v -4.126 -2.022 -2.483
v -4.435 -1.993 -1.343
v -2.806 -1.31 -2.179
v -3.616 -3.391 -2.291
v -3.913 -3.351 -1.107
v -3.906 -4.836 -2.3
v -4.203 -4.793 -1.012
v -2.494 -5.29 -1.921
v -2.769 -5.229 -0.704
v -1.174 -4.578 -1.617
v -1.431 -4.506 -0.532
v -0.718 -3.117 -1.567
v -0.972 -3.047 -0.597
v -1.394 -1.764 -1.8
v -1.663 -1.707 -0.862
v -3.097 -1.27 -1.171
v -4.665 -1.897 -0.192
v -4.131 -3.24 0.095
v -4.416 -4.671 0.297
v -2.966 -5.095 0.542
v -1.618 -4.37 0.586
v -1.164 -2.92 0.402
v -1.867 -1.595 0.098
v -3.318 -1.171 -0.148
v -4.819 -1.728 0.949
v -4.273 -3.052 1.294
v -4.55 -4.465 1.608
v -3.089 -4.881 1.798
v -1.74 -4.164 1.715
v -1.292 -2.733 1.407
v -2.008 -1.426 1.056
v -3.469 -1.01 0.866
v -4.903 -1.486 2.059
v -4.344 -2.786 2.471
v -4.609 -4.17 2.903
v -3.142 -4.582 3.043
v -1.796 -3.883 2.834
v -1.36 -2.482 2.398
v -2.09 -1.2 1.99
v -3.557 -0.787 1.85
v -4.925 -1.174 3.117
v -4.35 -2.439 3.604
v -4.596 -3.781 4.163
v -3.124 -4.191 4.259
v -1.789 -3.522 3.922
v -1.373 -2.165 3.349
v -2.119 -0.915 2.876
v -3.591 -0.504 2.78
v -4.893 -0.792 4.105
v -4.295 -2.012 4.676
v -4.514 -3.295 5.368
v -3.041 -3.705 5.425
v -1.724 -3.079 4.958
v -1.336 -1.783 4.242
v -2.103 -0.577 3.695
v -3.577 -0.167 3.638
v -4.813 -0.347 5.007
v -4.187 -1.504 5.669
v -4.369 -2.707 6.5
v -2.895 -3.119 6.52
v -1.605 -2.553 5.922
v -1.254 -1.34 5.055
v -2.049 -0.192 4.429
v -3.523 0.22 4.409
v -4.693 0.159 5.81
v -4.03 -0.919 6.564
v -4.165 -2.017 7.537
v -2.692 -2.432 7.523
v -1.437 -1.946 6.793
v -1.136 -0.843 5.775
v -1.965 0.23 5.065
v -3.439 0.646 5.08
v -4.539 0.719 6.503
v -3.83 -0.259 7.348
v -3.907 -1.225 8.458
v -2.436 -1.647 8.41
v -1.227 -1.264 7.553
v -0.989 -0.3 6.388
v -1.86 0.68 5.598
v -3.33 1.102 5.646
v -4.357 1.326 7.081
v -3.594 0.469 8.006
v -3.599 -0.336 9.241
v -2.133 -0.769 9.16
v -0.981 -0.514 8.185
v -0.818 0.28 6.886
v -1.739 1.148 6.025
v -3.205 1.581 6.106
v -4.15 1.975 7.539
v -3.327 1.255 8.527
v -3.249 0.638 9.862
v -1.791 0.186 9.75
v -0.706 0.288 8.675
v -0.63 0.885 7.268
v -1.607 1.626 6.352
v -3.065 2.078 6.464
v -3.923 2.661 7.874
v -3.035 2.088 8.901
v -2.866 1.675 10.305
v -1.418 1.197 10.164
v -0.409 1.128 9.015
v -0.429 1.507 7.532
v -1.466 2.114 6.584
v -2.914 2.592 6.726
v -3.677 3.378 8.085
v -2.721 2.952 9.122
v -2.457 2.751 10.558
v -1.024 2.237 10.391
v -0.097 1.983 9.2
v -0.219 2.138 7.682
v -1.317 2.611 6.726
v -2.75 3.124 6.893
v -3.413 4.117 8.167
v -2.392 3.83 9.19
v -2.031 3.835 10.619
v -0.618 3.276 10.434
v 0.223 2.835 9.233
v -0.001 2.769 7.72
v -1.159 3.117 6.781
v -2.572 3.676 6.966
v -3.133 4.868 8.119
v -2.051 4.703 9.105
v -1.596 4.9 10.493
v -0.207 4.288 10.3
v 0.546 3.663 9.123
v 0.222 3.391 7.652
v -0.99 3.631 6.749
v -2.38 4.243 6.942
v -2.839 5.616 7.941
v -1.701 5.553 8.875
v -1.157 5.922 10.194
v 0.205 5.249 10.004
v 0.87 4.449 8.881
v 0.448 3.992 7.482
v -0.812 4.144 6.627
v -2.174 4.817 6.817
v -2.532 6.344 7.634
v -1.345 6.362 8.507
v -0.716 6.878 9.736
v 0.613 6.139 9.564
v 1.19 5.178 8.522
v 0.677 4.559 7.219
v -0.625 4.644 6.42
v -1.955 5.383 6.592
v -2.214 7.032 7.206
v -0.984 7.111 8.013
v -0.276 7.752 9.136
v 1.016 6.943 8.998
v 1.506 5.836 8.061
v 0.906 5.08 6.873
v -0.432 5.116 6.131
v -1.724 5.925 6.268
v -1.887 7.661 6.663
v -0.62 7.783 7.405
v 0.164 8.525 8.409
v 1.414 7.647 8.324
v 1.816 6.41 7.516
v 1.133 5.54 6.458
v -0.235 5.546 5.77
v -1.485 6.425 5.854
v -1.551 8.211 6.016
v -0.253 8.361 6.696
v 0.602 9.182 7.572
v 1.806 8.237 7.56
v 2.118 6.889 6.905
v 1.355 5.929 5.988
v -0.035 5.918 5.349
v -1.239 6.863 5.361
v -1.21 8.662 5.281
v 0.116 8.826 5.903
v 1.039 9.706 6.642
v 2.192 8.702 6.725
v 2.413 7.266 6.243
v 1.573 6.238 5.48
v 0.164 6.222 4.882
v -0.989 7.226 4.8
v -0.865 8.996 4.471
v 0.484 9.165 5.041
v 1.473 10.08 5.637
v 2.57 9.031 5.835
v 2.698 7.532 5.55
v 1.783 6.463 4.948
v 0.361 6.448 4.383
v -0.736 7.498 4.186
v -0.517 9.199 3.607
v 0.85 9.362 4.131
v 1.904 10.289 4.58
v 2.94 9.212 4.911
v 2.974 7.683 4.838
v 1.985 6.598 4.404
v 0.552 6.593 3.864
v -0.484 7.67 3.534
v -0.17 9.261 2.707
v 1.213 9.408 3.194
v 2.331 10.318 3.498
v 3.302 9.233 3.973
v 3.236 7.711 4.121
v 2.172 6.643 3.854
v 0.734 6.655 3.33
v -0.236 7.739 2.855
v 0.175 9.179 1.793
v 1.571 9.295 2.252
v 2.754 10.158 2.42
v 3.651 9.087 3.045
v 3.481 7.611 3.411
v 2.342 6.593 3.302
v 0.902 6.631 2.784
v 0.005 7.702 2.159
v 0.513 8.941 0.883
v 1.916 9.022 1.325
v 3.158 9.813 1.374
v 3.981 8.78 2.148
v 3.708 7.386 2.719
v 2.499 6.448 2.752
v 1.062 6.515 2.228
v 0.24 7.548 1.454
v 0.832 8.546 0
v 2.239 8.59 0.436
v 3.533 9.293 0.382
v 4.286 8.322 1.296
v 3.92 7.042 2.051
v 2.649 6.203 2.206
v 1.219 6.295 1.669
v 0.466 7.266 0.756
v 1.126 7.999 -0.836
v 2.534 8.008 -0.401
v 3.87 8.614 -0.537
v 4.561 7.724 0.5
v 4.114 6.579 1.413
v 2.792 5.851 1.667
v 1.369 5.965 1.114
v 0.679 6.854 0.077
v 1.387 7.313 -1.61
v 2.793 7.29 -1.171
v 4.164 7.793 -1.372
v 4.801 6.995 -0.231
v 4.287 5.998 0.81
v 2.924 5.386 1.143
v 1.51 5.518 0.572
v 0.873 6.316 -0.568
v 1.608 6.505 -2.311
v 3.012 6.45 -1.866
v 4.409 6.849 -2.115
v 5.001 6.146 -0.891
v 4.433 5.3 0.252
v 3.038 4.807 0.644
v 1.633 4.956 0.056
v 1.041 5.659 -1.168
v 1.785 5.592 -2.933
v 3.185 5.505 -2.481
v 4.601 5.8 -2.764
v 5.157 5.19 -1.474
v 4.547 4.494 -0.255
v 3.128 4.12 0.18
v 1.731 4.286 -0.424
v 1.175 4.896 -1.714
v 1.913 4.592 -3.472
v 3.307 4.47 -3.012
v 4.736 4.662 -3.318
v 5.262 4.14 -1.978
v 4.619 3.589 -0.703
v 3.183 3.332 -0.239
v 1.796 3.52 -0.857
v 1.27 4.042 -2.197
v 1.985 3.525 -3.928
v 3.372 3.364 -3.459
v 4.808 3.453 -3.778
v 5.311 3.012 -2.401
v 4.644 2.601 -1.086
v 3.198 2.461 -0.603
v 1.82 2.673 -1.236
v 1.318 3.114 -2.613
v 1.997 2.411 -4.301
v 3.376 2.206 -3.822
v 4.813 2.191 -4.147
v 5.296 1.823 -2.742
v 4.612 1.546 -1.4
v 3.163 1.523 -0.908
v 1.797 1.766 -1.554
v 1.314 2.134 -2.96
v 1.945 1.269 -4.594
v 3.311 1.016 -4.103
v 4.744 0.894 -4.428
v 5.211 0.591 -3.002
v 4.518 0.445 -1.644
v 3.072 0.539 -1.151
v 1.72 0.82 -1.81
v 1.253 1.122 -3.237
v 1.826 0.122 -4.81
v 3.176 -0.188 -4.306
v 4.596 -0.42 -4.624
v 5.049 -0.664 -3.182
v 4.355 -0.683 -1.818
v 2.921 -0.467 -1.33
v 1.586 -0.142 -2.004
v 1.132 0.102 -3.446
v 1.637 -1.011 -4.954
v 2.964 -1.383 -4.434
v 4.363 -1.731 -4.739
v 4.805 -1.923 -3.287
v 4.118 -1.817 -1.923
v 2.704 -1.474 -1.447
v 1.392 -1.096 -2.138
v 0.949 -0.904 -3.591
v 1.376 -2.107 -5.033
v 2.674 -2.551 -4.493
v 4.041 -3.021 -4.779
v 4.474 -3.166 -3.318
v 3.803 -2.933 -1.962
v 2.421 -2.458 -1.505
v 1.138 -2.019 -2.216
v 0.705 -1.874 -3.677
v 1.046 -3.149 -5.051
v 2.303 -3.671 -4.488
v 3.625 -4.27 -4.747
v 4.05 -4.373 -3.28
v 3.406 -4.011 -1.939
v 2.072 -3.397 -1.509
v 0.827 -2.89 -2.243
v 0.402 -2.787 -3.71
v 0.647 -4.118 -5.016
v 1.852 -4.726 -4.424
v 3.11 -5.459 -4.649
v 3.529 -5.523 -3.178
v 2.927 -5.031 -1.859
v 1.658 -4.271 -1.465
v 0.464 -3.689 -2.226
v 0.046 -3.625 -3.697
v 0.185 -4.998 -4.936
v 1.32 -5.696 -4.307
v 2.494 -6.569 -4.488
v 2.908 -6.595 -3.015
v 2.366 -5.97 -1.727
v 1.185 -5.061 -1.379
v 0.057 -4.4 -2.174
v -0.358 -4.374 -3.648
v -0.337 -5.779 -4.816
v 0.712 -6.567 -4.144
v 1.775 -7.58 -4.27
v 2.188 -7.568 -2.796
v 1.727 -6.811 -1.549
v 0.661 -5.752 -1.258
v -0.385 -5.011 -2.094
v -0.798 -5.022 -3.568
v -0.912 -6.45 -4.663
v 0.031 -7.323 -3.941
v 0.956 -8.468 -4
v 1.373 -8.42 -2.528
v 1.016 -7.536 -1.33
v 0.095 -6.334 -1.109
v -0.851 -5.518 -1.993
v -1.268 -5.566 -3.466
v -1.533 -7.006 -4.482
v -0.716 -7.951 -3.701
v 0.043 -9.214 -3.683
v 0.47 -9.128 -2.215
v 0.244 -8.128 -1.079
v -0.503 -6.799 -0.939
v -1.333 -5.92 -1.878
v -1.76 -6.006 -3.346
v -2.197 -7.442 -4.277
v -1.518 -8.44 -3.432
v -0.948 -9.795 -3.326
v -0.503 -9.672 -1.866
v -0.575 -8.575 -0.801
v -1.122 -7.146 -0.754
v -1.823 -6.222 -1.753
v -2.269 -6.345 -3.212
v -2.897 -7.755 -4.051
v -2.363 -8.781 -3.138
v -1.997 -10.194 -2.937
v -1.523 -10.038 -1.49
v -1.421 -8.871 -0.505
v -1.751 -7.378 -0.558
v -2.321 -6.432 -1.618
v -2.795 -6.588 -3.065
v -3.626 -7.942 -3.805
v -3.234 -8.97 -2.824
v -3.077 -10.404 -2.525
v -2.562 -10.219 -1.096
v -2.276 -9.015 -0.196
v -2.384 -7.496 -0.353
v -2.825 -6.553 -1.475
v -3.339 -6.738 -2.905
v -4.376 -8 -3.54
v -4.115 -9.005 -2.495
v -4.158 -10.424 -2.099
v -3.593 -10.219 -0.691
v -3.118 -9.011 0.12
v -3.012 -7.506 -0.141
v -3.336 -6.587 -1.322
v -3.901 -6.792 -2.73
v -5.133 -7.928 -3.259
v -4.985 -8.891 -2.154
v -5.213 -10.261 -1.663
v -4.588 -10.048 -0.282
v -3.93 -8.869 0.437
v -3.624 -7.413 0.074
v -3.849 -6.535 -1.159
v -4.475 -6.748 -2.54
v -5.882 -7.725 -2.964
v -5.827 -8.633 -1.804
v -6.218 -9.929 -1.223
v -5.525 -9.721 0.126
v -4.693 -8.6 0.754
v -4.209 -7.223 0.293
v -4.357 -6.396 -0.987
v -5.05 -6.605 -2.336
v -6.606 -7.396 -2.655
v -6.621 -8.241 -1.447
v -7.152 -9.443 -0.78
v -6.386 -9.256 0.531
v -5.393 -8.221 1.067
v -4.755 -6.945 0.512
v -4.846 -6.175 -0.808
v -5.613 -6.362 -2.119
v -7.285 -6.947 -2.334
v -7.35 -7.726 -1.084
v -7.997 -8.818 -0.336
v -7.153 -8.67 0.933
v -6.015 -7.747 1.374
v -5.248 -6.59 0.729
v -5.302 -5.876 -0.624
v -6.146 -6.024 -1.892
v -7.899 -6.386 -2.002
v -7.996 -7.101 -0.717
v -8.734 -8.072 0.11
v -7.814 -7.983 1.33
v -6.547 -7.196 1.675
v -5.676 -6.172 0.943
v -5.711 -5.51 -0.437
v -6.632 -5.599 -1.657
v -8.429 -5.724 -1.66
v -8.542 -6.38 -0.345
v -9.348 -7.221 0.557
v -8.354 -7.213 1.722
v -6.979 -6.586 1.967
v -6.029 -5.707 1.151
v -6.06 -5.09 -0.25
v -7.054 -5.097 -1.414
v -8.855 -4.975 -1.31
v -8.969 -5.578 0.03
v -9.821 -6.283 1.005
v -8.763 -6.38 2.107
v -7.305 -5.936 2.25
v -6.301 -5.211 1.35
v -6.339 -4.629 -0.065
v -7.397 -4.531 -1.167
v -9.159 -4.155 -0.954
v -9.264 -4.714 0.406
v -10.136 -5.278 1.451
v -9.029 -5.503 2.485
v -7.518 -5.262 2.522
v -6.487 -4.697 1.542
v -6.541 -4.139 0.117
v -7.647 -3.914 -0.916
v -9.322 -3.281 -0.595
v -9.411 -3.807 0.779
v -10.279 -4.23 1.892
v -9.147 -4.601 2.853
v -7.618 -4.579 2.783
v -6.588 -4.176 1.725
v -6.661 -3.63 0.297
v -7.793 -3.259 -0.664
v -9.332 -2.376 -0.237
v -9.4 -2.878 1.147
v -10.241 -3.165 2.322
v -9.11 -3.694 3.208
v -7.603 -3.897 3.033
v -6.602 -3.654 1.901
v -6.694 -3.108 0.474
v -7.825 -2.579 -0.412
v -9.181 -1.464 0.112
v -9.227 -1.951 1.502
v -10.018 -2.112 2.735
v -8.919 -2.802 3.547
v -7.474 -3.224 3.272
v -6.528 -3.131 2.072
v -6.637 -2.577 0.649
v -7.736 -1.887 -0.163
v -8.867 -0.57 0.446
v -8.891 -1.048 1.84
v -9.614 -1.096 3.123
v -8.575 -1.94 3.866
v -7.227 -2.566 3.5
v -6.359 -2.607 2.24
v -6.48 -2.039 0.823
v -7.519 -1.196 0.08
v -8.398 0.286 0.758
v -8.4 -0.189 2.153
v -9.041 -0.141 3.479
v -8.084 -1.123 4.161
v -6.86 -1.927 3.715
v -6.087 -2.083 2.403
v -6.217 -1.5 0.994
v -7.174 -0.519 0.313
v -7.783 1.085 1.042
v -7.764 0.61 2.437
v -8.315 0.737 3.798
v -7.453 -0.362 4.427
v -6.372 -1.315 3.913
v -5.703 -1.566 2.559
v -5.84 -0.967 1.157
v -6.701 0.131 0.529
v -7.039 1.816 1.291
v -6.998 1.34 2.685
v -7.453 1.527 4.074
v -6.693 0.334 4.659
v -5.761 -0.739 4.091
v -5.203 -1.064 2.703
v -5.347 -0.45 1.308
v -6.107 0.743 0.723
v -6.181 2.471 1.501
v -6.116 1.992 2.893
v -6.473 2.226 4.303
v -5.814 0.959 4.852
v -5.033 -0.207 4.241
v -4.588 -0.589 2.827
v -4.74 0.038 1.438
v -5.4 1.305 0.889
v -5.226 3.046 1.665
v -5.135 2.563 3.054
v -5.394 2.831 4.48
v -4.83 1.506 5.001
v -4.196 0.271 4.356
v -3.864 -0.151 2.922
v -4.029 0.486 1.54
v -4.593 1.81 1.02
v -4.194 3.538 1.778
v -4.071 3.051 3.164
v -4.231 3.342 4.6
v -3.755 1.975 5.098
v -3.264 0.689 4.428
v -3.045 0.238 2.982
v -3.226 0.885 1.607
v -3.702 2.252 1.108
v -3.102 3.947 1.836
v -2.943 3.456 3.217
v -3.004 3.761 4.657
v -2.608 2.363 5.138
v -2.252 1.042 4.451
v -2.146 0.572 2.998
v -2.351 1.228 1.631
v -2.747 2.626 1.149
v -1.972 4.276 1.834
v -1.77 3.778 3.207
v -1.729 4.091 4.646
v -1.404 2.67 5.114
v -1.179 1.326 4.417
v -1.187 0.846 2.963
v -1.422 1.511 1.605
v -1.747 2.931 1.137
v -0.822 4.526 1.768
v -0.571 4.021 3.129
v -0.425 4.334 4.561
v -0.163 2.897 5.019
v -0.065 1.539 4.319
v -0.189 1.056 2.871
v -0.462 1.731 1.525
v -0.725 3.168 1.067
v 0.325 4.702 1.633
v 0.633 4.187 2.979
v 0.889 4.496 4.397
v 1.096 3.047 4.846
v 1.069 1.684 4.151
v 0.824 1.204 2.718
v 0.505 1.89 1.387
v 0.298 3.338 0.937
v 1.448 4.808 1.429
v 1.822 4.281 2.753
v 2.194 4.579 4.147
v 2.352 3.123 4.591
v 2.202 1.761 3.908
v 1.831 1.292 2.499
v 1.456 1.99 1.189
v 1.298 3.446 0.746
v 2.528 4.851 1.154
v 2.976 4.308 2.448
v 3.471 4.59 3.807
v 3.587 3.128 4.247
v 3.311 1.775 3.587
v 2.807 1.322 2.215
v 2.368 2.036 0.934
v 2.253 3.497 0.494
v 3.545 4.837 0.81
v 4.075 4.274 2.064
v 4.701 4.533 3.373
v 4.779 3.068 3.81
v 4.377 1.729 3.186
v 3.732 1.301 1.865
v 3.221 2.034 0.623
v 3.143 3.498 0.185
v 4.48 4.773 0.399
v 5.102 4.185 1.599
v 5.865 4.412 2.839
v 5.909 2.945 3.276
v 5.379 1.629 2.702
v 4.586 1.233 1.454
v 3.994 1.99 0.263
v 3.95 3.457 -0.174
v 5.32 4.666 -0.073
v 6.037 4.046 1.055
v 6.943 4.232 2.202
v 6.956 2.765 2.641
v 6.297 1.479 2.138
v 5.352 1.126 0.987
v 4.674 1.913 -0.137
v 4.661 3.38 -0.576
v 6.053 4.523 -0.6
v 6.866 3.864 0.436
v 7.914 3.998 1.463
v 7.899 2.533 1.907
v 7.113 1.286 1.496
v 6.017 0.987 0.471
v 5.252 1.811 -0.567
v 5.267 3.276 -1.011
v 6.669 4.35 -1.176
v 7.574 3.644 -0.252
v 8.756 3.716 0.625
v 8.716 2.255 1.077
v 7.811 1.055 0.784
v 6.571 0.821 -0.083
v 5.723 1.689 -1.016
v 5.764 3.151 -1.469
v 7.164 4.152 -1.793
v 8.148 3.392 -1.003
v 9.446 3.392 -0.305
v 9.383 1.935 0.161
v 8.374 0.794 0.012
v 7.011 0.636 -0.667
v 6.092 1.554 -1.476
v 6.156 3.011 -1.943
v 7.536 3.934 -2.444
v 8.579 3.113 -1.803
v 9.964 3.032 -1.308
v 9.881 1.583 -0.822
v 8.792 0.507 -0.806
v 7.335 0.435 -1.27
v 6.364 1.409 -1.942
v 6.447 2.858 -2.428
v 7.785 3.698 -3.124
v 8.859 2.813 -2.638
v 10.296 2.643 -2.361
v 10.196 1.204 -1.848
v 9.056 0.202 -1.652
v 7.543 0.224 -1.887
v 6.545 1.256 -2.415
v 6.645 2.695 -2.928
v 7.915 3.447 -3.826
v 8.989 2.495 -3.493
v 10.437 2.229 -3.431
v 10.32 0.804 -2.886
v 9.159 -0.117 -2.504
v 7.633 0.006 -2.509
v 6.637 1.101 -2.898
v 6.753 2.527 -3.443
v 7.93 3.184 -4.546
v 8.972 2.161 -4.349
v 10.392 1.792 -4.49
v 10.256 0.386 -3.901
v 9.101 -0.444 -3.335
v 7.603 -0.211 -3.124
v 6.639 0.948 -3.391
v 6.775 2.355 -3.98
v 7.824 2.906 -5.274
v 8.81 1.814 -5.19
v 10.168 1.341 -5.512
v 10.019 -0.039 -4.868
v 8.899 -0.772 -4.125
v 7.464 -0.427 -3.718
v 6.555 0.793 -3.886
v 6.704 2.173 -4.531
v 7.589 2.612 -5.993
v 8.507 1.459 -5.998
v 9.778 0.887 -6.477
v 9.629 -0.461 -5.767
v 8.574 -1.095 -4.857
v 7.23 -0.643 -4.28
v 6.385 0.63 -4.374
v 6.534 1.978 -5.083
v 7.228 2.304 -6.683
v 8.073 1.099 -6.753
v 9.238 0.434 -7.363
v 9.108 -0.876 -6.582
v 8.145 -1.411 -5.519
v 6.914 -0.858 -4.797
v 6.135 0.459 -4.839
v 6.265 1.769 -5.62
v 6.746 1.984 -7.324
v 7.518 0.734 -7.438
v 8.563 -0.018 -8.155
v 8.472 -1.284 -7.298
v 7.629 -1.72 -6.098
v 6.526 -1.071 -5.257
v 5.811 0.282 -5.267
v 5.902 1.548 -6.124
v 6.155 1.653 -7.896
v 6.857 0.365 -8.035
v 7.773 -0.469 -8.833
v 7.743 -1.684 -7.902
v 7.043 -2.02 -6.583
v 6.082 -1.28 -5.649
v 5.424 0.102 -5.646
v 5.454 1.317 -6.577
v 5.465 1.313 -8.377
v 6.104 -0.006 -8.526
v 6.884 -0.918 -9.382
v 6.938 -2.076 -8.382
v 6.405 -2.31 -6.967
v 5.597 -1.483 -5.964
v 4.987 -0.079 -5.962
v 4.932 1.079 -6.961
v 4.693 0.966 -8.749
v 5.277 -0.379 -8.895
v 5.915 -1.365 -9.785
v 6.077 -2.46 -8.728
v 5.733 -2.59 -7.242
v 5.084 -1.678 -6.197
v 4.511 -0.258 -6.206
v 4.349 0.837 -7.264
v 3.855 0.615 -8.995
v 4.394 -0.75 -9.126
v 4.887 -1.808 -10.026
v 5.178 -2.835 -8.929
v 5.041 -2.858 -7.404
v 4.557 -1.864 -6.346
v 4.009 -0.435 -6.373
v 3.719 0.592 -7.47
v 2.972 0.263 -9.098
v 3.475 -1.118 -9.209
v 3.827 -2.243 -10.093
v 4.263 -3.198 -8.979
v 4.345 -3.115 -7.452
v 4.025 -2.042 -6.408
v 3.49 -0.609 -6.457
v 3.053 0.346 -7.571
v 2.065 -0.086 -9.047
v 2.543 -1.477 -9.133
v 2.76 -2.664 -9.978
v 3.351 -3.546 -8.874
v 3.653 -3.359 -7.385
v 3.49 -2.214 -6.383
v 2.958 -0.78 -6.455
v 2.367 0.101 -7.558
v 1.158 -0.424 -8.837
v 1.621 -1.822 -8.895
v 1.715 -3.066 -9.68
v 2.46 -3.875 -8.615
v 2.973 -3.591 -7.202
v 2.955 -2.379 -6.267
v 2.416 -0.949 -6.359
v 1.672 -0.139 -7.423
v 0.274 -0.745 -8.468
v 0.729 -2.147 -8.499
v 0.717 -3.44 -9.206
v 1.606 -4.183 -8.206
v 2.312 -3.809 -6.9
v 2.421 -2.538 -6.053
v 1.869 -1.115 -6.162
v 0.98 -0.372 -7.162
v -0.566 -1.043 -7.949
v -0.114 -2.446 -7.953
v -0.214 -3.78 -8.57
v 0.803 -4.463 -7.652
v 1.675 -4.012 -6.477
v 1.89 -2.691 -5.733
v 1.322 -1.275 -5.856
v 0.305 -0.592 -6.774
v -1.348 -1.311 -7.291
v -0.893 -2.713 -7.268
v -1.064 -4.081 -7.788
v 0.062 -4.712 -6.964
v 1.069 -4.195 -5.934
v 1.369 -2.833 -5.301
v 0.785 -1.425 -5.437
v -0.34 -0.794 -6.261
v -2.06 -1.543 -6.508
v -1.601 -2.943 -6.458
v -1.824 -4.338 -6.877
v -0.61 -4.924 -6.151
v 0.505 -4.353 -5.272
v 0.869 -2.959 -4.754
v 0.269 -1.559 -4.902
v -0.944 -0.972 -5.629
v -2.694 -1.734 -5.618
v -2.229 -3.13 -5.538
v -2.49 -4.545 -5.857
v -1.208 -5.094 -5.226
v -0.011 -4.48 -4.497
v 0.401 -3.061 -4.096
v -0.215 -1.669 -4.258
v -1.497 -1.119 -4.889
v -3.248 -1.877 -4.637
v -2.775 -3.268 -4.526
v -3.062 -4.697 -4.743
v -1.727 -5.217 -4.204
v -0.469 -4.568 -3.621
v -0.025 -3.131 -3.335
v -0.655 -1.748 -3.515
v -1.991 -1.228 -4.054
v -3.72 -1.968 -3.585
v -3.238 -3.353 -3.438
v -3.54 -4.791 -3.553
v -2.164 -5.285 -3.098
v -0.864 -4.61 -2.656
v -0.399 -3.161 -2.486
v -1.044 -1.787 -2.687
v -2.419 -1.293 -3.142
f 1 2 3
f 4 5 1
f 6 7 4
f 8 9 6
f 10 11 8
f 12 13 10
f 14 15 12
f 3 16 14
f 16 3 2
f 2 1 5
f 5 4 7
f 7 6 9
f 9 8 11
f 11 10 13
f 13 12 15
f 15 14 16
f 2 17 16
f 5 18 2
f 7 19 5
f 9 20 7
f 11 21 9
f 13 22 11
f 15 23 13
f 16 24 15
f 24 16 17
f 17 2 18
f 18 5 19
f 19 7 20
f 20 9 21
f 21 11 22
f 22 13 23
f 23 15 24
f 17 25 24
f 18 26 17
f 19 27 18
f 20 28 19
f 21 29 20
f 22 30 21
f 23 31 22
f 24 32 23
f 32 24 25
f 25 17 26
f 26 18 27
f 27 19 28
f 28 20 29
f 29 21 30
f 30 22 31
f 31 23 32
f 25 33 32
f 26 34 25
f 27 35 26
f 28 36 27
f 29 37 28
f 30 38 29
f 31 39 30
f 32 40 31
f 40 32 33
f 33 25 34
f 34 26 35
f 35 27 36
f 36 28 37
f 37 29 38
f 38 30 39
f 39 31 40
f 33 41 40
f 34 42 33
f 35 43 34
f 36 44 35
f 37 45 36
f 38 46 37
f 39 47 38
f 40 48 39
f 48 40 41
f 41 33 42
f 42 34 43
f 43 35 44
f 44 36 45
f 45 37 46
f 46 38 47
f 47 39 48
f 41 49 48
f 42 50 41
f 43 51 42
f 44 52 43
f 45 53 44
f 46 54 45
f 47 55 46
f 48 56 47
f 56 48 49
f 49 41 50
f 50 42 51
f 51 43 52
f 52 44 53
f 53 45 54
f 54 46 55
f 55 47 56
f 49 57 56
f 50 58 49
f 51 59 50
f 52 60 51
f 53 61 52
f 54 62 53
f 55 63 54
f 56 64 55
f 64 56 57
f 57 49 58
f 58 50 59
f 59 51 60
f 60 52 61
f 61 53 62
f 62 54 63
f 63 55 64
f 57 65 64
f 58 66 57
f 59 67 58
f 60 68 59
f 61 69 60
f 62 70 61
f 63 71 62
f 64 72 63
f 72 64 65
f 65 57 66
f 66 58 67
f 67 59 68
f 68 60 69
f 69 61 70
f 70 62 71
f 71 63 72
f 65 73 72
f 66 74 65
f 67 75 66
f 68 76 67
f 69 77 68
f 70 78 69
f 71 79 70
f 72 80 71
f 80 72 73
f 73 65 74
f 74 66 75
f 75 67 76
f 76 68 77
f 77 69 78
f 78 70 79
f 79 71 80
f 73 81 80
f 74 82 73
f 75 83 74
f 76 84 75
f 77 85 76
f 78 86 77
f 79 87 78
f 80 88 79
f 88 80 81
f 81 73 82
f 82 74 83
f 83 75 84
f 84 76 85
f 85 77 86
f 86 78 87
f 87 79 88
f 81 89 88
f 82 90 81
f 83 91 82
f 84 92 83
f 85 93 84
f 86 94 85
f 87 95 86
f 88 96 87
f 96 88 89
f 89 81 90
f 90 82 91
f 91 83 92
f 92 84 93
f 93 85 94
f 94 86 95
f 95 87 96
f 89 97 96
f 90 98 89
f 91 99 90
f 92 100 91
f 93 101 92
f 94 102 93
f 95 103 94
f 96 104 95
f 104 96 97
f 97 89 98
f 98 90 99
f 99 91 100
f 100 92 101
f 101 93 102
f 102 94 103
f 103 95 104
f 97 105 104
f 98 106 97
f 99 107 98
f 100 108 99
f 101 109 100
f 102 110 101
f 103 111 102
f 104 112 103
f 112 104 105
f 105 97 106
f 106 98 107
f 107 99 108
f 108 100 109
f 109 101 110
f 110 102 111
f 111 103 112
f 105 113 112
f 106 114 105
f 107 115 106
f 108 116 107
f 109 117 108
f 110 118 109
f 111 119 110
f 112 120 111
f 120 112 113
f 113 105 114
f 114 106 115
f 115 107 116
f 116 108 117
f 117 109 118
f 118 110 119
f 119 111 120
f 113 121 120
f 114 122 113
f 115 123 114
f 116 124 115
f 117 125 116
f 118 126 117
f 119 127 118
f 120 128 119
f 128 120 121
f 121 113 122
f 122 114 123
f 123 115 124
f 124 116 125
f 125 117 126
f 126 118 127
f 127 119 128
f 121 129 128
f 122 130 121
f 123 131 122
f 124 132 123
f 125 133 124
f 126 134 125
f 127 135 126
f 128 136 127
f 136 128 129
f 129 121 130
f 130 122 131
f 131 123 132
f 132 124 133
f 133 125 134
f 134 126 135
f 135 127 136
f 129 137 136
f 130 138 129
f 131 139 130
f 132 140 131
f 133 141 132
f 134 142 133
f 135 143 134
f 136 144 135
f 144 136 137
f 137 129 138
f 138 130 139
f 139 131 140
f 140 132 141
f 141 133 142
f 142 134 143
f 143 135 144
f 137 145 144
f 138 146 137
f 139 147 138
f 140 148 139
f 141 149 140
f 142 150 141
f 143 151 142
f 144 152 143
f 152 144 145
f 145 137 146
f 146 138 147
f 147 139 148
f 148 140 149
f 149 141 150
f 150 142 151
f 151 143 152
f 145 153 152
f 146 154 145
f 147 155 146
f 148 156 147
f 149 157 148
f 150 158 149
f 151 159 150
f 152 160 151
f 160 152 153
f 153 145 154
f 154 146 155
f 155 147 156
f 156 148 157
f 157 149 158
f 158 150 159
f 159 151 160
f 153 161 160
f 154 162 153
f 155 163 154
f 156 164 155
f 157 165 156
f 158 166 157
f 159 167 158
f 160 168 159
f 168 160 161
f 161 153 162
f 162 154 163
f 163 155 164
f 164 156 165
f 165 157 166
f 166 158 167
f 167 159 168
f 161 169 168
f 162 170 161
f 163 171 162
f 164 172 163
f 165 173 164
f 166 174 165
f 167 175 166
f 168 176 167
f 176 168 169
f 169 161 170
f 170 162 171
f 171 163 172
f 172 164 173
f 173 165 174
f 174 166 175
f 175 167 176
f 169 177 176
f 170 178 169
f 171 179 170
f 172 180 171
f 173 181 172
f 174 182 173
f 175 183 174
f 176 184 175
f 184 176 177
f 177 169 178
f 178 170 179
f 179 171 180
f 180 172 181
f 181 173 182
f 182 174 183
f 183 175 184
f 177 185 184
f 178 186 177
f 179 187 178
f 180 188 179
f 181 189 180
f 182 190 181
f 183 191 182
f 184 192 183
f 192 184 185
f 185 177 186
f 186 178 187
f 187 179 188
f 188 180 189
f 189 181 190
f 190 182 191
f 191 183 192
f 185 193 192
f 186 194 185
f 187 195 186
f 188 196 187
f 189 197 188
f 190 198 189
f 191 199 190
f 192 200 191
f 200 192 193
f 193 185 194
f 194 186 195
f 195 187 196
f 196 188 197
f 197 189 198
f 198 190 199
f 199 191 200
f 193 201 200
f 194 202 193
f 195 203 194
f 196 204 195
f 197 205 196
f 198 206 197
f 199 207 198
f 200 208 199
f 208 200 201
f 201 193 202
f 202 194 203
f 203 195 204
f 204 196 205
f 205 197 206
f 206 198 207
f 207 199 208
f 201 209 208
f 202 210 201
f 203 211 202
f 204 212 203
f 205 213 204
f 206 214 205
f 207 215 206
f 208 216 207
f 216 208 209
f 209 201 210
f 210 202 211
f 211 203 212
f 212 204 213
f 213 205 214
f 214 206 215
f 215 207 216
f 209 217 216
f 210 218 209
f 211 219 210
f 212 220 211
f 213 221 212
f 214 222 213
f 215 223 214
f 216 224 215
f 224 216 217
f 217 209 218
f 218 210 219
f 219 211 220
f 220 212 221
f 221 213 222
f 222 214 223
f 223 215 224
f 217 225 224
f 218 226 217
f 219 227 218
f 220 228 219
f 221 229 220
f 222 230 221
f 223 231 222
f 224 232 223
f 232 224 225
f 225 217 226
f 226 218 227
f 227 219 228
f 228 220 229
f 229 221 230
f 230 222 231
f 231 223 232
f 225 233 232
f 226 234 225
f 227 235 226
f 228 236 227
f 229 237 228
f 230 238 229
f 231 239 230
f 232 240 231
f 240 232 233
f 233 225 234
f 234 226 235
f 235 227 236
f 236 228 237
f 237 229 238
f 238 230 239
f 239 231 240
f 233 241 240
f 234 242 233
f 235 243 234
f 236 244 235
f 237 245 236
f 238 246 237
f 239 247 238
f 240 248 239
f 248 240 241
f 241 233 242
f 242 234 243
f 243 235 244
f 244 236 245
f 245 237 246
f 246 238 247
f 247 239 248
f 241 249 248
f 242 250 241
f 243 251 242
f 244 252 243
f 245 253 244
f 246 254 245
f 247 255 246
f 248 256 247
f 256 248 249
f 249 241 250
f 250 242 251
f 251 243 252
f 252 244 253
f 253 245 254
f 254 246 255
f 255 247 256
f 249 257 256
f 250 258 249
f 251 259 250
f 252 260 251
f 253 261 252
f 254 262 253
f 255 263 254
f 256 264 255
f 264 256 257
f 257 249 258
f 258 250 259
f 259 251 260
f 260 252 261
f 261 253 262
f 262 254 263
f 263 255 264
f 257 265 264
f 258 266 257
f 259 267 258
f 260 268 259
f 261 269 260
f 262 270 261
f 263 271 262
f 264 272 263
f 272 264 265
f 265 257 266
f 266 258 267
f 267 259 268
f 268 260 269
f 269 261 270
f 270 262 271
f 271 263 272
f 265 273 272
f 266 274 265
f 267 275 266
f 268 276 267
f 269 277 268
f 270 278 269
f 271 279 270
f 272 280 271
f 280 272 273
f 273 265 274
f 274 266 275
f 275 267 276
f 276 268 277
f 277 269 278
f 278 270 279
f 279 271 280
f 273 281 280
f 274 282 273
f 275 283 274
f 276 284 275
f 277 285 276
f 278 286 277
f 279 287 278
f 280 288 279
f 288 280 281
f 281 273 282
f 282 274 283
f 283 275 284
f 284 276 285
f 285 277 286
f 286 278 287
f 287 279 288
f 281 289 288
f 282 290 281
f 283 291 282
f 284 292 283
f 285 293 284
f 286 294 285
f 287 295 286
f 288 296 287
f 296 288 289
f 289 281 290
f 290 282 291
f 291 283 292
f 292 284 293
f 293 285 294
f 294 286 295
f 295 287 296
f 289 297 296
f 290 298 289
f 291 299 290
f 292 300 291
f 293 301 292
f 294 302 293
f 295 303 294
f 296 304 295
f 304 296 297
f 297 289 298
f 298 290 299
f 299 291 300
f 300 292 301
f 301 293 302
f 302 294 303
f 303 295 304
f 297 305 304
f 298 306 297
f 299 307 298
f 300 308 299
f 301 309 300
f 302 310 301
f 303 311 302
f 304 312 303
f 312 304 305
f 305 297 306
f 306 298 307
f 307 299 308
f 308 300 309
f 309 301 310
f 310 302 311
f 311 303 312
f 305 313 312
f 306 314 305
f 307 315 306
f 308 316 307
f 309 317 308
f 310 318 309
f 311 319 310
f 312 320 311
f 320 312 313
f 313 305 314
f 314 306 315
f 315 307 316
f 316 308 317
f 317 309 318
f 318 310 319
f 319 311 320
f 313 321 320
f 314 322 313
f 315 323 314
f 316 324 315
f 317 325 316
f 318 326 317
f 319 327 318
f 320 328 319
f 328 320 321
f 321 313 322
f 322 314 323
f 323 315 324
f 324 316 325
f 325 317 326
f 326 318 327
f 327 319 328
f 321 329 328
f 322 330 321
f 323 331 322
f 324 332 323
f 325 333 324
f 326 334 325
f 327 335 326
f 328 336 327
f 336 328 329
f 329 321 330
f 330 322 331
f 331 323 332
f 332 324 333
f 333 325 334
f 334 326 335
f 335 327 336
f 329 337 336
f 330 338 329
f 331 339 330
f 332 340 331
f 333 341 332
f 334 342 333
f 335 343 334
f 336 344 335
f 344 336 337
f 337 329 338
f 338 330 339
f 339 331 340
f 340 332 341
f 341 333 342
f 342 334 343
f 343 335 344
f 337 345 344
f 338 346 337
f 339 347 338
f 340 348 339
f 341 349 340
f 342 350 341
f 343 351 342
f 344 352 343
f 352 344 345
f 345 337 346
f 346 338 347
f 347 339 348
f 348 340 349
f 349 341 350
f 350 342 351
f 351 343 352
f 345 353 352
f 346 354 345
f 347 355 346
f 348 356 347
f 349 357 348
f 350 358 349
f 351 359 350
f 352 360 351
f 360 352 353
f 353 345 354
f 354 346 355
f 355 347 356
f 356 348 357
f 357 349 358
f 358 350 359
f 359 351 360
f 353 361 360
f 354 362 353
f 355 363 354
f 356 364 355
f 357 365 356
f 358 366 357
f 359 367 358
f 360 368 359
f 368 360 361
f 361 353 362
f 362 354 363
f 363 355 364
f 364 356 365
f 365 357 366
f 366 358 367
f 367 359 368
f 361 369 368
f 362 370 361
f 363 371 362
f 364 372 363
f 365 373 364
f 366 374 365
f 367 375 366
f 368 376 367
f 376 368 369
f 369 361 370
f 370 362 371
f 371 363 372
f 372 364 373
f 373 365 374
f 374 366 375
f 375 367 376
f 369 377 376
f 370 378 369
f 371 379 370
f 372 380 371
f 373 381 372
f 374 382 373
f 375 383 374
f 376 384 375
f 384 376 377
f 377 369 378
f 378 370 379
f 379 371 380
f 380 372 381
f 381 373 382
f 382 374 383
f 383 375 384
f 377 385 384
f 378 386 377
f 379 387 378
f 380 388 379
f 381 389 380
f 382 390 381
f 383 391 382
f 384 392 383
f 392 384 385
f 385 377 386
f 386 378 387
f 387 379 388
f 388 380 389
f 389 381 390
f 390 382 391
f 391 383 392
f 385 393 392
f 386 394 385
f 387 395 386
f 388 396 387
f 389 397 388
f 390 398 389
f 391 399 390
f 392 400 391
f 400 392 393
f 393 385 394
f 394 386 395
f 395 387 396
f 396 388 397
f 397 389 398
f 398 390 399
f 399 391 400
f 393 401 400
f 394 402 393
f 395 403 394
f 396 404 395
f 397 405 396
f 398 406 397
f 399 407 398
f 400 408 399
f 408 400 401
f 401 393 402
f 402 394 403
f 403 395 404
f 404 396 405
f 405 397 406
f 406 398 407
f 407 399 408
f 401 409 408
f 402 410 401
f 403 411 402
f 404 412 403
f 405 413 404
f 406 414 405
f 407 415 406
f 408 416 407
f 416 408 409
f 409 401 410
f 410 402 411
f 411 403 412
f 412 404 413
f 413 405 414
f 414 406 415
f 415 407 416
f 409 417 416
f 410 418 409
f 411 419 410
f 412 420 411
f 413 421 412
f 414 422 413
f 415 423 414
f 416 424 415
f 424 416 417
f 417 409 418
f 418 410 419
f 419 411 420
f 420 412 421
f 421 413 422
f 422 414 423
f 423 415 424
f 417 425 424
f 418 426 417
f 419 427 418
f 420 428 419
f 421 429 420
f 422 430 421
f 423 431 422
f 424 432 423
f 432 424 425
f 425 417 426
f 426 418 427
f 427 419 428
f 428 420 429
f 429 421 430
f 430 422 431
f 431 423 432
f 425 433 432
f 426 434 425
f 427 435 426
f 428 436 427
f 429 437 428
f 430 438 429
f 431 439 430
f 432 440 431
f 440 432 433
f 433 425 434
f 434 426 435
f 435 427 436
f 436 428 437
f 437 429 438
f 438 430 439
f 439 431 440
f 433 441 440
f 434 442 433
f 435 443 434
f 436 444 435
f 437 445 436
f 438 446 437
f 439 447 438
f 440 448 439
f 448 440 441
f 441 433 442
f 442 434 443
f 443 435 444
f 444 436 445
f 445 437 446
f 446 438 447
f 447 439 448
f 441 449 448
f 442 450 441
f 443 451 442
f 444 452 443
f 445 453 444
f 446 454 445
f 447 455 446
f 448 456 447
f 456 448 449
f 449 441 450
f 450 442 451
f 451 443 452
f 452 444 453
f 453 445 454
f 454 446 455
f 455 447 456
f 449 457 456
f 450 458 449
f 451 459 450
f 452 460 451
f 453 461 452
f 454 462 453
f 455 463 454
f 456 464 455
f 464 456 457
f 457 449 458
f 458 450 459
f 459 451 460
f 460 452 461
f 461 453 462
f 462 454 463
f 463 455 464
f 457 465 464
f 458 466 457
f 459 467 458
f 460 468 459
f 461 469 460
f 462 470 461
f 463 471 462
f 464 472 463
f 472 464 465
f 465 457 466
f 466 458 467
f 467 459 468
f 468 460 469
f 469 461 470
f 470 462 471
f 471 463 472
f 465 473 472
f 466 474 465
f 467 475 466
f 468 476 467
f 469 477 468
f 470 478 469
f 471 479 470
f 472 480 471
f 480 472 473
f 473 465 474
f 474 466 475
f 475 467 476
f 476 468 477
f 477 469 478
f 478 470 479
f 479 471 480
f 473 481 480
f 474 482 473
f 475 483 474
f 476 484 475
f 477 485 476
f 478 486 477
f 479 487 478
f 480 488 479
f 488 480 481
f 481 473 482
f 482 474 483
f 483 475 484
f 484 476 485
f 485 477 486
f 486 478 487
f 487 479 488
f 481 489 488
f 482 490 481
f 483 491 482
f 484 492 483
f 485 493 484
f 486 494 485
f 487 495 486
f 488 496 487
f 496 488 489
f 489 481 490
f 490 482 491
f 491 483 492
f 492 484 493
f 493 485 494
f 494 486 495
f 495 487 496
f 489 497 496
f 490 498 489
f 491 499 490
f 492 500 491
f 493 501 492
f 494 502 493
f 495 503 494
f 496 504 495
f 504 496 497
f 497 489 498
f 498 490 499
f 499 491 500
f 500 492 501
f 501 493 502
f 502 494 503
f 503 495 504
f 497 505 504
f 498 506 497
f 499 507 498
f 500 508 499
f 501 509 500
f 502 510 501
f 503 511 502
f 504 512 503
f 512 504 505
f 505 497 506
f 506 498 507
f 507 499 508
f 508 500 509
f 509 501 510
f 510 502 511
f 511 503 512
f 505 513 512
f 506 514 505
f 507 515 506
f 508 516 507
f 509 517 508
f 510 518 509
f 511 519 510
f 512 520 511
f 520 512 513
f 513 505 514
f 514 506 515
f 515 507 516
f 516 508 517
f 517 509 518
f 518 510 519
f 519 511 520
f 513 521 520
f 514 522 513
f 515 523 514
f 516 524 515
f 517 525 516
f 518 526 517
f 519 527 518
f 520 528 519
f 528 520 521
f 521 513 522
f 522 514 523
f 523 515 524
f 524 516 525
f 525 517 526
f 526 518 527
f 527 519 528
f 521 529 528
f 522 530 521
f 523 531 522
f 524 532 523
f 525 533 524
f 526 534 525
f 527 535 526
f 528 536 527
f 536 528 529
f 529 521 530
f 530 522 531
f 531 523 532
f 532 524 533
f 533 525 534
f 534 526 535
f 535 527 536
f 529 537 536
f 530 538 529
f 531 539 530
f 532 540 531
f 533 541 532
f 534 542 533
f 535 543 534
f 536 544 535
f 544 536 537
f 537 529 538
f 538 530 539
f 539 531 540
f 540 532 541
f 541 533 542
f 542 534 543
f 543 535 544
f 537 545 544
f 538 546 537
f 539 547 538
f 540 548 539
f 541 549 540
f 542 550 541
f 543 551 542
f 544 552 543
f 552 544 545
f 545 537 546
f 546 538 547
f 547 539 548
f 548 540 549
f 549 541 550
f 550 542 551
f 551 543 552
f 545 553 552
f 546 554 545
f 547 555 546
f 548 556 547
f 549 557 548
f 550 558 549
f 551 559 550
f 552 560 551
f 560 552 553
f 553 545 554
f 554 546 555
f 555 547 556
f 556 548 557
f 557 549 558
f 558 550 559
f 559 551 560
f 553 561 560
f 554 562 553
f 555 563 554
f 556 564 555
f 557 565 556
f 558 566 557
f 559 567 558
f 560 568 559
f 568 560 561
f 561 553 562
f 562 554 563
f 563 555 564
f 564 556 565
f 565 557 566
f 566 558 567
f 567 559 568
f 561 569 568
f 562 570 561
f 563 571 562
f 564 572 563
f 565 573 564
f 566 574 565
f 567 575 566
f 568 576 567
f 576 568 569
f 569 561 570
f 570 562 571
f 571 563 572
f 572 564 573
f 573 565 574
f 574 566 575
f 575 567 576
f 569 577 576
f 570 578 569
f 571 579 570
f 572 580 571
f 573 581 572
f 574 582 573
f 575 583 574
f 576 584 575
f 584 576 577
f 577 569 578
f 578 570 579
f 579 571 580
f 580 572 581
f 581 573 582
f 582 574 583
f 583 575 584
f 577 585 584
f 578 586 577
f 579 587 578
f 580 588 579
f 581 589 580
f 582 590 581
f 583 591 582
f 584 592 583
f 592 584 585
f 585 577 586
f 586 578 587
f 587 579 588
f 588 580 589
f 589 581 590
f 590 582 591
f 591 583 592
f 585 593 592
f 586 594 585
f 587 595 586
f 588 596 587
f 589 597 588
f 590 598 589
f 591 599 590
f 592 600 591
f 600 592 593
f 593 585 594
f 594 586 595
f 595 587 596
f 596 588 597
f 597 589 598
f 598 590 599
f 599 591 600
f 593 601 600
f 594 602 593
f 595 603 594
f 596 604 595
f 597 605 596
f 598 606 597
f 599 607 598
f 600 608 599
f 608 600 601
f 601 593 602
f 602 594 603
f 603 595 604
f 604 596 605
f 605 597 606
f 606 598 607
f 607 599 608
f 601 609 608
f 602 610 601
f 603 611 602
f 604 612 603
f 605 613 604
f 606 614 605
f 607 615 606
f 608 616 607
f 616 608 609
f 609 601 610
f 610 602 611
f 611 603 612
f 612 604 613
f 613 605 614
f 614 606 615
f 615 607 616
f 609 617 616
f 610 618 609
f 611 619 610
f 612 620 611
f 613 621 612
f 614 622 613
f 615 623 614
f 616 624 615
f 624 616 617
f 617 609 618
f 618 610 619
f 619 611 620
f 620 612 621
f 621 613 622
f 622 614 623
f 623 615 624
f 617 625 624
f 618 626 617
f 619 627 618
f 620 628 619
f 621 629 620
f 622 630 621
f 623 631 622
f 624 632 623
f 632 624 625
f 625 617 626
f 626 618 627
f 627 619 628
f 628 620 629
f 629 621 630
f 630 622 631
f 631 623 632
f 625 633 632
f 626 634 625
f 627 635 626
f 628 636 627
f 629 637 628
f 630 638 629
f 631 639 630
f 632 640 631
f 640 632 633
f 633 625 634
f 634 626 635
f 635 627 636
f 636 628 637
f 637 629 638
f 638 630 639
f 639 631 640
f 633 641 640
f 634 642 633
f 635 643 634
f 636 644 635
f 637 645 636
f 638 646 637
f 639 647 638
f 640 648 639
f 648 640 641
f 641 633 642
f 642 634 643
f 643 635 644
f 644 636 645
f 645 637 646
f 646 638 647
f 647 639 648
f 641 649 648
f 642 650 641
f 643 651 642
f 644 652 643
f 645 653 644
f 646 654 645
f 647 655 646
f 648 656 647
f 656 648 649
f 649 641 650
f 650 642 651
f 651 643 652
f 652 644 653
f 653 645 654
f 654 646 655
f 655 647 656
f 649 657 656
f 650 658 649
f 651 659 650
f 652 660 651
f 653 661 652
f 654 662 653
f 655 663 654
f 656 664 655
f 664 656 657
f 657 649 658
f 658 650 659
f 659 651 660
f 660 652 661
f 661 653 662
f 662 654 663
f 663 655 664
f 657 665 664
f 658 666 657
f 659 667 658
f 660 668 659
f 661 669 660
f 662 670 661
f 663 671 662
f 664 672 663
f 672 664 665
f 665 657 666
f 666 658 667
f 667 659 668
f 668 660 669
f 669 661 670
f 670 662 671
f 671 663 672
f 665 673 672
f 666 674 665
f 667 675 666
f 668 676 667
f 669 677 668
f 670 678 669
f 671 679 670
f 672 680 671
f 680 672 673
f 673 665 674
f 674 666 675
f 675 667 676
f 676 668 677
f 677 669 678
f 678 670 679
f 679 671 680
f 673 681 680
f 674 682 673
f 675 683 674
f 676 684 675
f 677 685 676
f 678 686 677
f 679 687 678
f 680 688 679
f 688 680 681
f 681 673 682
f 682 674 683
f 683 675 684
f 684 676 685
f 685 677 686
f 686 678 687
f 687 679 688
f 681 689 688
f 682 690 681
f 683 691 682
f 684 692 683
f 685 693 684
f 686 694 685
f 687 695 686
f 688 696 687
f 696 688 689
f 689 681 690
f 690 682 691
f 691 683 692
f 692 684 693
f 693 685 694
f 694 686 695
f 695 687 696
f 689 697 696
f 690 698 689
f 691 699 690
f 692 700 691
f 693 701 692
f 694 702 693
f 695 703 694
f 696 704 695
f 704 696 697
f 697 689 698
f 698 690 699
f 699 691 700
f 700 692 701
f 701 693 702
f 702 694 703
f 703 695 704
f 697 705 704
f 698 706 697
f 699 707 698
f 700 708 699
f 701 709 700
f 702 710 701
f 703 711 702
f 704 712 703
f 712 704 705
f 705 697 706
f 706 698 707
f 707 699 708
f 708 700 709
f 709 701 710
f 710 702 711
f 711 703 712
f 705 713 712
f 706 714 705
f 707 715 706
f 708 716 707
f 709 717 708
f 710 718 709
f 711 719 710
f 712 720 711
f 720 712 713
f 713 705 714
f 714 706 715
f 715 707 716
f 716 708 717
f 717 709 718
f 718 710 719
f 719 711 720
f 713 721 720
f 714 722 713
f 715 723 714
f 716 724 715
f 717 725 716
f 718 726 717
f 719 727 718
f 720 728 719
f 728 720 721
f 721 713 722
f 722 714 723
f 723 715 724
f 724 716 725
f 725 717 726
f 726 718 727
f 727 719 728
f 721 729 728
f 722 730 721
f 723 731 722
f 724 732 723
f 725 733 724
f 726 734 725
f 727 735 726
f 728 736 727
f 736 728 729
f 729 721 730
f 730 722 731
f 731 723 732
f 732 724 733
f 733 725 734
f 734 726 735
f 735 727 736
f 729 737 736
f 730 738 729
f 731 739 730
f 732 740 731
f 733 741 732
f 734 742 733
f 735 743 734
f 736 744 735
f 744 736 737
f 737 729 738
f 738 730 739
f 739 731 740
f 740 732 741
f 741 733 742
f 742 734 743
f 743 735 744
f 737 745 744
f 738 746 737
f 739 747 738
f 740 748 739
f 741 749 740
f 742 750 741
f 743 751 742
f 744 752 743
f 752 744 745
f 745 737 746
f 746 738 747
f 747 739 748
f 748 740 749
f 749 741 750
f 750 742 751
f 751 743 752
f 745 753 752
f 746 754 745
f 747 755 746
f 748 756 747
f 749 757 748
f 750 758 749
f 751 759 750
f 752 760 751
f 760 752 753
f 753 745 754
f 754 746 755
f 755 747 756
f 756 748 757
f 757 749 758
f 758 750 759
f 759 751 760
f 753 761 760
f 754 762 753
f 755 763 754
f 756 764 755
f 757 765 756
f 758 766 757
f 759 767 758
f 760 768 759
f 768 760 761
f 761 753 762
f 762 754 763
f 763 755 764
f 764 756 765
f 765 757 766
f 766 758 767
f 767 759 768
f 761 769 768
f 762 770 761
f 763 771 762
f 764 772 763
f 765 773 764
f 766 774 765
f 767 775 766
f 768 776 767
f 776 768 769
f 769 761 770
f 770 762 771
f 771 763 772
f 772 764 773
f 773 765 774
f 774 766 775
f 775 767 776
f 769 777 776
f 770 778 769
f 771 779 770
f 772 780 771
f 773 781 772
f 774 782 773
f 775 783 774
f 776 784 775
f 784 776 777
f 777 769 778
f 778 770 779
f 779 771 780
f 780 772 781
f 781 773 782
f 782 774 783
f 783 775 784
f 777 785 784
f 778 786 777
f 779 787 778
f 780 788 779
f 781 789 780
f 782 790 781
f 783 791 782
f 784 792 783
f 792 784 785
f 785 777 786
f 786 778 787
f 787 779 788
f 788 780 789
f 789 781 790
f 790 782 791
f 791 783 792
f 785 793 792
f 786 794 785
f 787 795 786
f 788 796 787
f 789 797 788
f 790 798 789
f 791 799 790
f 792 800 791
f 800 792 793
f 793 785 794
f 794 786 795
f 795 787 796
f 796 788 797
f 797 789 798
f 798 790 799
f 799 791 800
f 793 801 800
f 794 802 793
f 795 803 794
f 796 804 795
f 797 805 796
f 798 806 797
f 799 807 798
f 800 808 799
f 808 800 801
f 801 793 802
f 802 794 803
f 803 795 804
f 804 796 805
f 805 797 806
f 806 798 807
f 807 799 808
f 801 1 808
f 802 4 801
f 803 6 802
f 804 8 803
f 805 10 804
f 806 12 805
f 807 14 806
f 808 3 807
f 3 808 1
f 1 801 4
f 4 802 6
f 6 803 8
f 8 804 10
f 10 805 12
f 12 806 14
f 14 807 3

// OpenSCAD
//  path_extrude.scad -- Extrude a path in 3D space
//  usage: add "use <path_extrude.scad>;" to the top of your OpenSCAD source code

//  Copyright (C) 2014-2019  David Eccles (gringer) <bioinformatics@gringene.org>

//  This program is free software: you can redistribute it and/or modify
//  it under the terms of the GNU General Public License as published by
//  the Free Software Foundation, either version 3 of the License, or
//  (at your option) any later version.

//  This program is distributed in the hope that it will be useful,
//  but WITHOUT ANY WARRANTY; without even the implied warranty of
//  MERCHANTABILITY or FITNESS FOR A PARTICULAR PURPOSE.  See the
//  GNU General Public License for more details.

//  You should have received a copy of the GNU General Public License
//  along with this program.  If not, see <https://www.gnu.org/licenses/>.

// Determine the projection of a point on a plane centered at c1 with normal n1
function project(p, c, n) =
    p - (n * (p - c)) * n / (n * n);

// determine angle between two points with a given normal orientation
// see https://stackoverflow.com/questions/14066933/
//        direct-way-of-computing-clockwise-angle-between-2-vectors
//    dot = p1 * p2;
//    det = (p1[0]*p2[1]*n1[2] + p2[0]*n1[1]*p1[2] + n1[0]*p1[1]*p2[2]) -
//          (n1[0]*p2[1]*p1[2] + p1[0]*n1[1]*p2[2] + p2[0]*p1[1]*n1[2]);
//    atan2(det, dot);
// determine angle between two planar points and a centre
// with a given normal orientation
function getPlanarAngle(p1, p2, c1, n1) =
    let(p1 = p1-c1, n1=n1 / norm(n1), p2=p2-c1)
    atan2((p1[0]*p2[1]*n1[2] + p2[0]*n1[1]*p1[2] + n1[0]*p1[1]*p2[2]) -
          (n1[0]*p2[1]*p1[2] + p1[0]*n1[1]*p2[2] + p2[0]*p1[1]*n1[2]), p1 * p2);

function c3D(tPoints) =
    (len(tPoints[0]) == undef) ? // single point
        c3D([tPoints])[0] :
        (len(tPoints[0]) < 3) ?  // collection of 2D points
            tPoints * [[1,0,0],[0,1,0]] :
            tPoints;             // 3D points

// translate a point (or points)
function myTranslate(ofs, points, acc = []) =
    (len(points[0]) == undef) ?
        myTranslate(ofs, [points])[0] :
        [ for(i = [0:(len(points) - 1)])
          [ for(d = [0:(len(points[0])-1)]) (ofs[d] + points[i][d])]];

// rotate a point (or points)
function myRotate(rotVec, points) =
    let(rotX = [[1,              0,               0],
                [0, cos(rotVec[0]), -sin(rotVec[0])],
                [0, sin(rotVec[0]),  cos(rotVec[0])]],
        rotY = [[ cos(rotVec[1]), 0,-sin(rotVec[1])],
                [              0, 1,              0],
                [ sin(rotVec[1]), 0, cos(rotVec[1])]],
        rotZ = [[ cos(rotVec[2]), sin(rotVec[2]), 0],
                [ sin(rotVec[2]), -cos(rotVec[2]), 0],
                [0,              0,               1]])
    (len(points[0]) == undef) ?
        myRotate(rotVec, [points])[0] :
        c3D(points) * rotX * rotY * rotZ;

// Determine spherical rotation for cartesian coordinates
function rToS(pt) =
    [-acos((pt[2]) / norm(pt)),
         0,
         -atan2(pt[0],pt[1])];

function calcPreRot(p1, p2, p3) =
  let(n1=p2-p1, // normal between the two points (i.e. the plane that the polygon sits on)
      n2=p3-p2,
      rt1=rToS(n1),
      rt2=rToS(n2),
      pj1=(p2 + myRotate(rt2, [[1e42,0,0]])[0]),
      pj2=project(p=(p1 + myRotate(rt1, [[1e42,0,0]])[0]), c=p2, n=n2))
  getPlanarAngle(p1=pj1, p2=pj2, c1=p2, n1=n2);

function cumSum(x, res=[]) =
  (len(x) == len(res)) ? concat([0], res) :
    (len(res) == 0) ? cumSum(x=x, res=[x[0]]) :
        cumSum(x=x, res=concat(res, [x[len(res)] + res[len(res)-1]]));

// Create extrusion side panels for one polygon segment as triangles.
// Note: panels are not necessarily be planar due to path twists
function makeSides(shs, pts, ofs=0) =
  concat(
    [for(i=[0:(shs-1)]) [i+ofs, ((i+1) % shs + ofs + shs) % (shs * pts),
                         (i+1) % shs + ofs]],
    [for(i=[0:(shs-1)]) [((i+1) % shs + ofs + shs) % (shs * pts),
                         i+ofs, (i + ofs + shs) % (shs * pts)]]);

// Concatenate the contents of the outermost list
function flatten(A, acc = [], aDone = 0) =
    (aDone >= len(A)) ? acc :
       flatten(A, acc=concat(acc, A[aDone]), aDone = aDone + 1);

// Linearly interpolate between two shapes
function makeTween(shape1, shape2, t) =
    (t == 0) ? shape1 :
      (t == 1) ? shape2 :
        [for (i=[0:(len(shape1)-1)])
          (shape1[i]*(1-t) + shape2[i % len(shape2)]*(t))];

// Extrude a 2D shape through a 3D path
// Note: merge has two effects:
//   1) Removes end caps
//   2) Adjusts the rotation of each path point
//      so that the end and start match up
module path_extrude(exPath, exShape, exShape2=[],
    exRots = [0], exScale = [1], merge=false, preRotate=true){
  exShapeTween = (len(exShape2) == 0) ?
    exShape : exShape2;
  shs = len(exShape); // shs: shape size
  pts = len(exPath);  // pts: path size
  exPathX = (merge) ? concat(exPath, [exPath[0], exPath[1]]) :
      concat(exPath,
            [exPath[pts-1] + (exPath[pts-1] - exPath[pts-2]),
             exPath[pts-1] + 2*(exPath[pts-1] - exPath[pts-2])]);
  exScaleX = (len(exScale) == len(exPath)) ? exScale :
      [for (i = [0:(pts-1)]) exScale[i % len(exScale)]];
  preRots = [for(i = [0:(pts-1)])
    preRotate ?
      calcPreRot(p1=exPathX[i], // "current" point on the path
                p2=exPathX[(i+1)], // "next" point on the path
                p3=exPathX[(i+2)]) :
      0 ];
  cumPreRots = cumSum(preRots);
  seDiff = cumPreRots[len(cumPreRots)-1]; // rotation difference (start - end)
  // rotation adjustment to get start to look like end
  seAdj = -seDiff / (len(cumPreRots));
  adjPreRots = (!merge) ? cumPreRots :
    [for(i = [0:(pts-1)]) (cumPreRots[i] + seAdj * i)];
  adjExRots = (len(exRots) == 1) ?
    [for(i = [0:(len(adjPreRots)-1)]) (adjPreRots[i] + exRots[0])] :
    [for(i = [0:(len(adjPreRots)-1)]) (adjPreRots[i] + exRots[i % len(exRots)])];
  phPoints = flatten([
    for(i = [0:(pts-1)])
      let(p1=exPathX[i],
          p2=exPathX[(i+1)],
          n1=p2-p1, // normal between the two points
          rt1=rToS(n1))
      myTranslate(p1, myRotate(rt1, myRotate([0,0,-adjExRots[i]],
        c3D(makeTween(exShape, exShapeTween, i / (pts-1)) *
          exScaleX[i]))))
    ]);
  if(merge){ // just the surface, no end caps
      polyhedron(points=phPoints,
        faces=flatten([
              for(i = [0:(pts-1)])
                makeSides(shs, pts, ofs=shs*i)
              ])
          );
  } else {
      polyhedron(points=phPoints,
        faces=concat(
            flatten([
              for(i = [0:(pts-2)])
                makeSides(shs, pts, ofs=shs*i)
              ]),
            concat( // add in start / end covers
              [[for(i= [0:(shs-1)]) i]],
              [[for(i= [(len(phPoints)-1):-1:(len(phPoints)-shs)]) i]]
            )
          ));
  }
}

myPathTrefoil = [ for(t = [0:(360 / 101):359]) [ // trefoil knot
    5*(.41*cos(t) - .18*sin(t) - .83*cos(2*t) - .83*sin(2*t) -
       .11*cos(3*t) + .27*sin(3*t)),
    5*(.36*cos(t) + .27*sin(t) - 1.13*cos(2*t) + .30*sin(2*t) +
       .11*cos(3*t) - .27*sin(3*t)),
    5*(.45*sin(t) - .30*cos(2*t) +1.13*sin(2*t) -
       .11*cos(3*t) + .27*sin(3*t))] ];

myPointsOctagon =
  let(ofs1=15)
  [ for(t = [0:(360/8):359])
     ((t==90)?1:2) * [cos(t+ofs1),sin(t+ofs1)]];
myPointsChunkOctagon =
  let(ofs1=15)
  [ for(t = [0:(360/8):359])
    ((t==90)?0.4:1.9) *
     [cos((t * 135/360 + 45)+ofs1+45)+0.5,sin((t * 135/360 + 45)+ofs1+45)]];
//myPoints = [ for(t = [0:(360/8):359]) 2 * [cos(t+45),sin(t+45)]];

pts=[2,0,0.5];

translate([0,0,0]) {
    path_extrude(exRots = [$t*360], exShape=myPointsOctagon,
                 exPath=myPathTrefoil, merge=true);
}
